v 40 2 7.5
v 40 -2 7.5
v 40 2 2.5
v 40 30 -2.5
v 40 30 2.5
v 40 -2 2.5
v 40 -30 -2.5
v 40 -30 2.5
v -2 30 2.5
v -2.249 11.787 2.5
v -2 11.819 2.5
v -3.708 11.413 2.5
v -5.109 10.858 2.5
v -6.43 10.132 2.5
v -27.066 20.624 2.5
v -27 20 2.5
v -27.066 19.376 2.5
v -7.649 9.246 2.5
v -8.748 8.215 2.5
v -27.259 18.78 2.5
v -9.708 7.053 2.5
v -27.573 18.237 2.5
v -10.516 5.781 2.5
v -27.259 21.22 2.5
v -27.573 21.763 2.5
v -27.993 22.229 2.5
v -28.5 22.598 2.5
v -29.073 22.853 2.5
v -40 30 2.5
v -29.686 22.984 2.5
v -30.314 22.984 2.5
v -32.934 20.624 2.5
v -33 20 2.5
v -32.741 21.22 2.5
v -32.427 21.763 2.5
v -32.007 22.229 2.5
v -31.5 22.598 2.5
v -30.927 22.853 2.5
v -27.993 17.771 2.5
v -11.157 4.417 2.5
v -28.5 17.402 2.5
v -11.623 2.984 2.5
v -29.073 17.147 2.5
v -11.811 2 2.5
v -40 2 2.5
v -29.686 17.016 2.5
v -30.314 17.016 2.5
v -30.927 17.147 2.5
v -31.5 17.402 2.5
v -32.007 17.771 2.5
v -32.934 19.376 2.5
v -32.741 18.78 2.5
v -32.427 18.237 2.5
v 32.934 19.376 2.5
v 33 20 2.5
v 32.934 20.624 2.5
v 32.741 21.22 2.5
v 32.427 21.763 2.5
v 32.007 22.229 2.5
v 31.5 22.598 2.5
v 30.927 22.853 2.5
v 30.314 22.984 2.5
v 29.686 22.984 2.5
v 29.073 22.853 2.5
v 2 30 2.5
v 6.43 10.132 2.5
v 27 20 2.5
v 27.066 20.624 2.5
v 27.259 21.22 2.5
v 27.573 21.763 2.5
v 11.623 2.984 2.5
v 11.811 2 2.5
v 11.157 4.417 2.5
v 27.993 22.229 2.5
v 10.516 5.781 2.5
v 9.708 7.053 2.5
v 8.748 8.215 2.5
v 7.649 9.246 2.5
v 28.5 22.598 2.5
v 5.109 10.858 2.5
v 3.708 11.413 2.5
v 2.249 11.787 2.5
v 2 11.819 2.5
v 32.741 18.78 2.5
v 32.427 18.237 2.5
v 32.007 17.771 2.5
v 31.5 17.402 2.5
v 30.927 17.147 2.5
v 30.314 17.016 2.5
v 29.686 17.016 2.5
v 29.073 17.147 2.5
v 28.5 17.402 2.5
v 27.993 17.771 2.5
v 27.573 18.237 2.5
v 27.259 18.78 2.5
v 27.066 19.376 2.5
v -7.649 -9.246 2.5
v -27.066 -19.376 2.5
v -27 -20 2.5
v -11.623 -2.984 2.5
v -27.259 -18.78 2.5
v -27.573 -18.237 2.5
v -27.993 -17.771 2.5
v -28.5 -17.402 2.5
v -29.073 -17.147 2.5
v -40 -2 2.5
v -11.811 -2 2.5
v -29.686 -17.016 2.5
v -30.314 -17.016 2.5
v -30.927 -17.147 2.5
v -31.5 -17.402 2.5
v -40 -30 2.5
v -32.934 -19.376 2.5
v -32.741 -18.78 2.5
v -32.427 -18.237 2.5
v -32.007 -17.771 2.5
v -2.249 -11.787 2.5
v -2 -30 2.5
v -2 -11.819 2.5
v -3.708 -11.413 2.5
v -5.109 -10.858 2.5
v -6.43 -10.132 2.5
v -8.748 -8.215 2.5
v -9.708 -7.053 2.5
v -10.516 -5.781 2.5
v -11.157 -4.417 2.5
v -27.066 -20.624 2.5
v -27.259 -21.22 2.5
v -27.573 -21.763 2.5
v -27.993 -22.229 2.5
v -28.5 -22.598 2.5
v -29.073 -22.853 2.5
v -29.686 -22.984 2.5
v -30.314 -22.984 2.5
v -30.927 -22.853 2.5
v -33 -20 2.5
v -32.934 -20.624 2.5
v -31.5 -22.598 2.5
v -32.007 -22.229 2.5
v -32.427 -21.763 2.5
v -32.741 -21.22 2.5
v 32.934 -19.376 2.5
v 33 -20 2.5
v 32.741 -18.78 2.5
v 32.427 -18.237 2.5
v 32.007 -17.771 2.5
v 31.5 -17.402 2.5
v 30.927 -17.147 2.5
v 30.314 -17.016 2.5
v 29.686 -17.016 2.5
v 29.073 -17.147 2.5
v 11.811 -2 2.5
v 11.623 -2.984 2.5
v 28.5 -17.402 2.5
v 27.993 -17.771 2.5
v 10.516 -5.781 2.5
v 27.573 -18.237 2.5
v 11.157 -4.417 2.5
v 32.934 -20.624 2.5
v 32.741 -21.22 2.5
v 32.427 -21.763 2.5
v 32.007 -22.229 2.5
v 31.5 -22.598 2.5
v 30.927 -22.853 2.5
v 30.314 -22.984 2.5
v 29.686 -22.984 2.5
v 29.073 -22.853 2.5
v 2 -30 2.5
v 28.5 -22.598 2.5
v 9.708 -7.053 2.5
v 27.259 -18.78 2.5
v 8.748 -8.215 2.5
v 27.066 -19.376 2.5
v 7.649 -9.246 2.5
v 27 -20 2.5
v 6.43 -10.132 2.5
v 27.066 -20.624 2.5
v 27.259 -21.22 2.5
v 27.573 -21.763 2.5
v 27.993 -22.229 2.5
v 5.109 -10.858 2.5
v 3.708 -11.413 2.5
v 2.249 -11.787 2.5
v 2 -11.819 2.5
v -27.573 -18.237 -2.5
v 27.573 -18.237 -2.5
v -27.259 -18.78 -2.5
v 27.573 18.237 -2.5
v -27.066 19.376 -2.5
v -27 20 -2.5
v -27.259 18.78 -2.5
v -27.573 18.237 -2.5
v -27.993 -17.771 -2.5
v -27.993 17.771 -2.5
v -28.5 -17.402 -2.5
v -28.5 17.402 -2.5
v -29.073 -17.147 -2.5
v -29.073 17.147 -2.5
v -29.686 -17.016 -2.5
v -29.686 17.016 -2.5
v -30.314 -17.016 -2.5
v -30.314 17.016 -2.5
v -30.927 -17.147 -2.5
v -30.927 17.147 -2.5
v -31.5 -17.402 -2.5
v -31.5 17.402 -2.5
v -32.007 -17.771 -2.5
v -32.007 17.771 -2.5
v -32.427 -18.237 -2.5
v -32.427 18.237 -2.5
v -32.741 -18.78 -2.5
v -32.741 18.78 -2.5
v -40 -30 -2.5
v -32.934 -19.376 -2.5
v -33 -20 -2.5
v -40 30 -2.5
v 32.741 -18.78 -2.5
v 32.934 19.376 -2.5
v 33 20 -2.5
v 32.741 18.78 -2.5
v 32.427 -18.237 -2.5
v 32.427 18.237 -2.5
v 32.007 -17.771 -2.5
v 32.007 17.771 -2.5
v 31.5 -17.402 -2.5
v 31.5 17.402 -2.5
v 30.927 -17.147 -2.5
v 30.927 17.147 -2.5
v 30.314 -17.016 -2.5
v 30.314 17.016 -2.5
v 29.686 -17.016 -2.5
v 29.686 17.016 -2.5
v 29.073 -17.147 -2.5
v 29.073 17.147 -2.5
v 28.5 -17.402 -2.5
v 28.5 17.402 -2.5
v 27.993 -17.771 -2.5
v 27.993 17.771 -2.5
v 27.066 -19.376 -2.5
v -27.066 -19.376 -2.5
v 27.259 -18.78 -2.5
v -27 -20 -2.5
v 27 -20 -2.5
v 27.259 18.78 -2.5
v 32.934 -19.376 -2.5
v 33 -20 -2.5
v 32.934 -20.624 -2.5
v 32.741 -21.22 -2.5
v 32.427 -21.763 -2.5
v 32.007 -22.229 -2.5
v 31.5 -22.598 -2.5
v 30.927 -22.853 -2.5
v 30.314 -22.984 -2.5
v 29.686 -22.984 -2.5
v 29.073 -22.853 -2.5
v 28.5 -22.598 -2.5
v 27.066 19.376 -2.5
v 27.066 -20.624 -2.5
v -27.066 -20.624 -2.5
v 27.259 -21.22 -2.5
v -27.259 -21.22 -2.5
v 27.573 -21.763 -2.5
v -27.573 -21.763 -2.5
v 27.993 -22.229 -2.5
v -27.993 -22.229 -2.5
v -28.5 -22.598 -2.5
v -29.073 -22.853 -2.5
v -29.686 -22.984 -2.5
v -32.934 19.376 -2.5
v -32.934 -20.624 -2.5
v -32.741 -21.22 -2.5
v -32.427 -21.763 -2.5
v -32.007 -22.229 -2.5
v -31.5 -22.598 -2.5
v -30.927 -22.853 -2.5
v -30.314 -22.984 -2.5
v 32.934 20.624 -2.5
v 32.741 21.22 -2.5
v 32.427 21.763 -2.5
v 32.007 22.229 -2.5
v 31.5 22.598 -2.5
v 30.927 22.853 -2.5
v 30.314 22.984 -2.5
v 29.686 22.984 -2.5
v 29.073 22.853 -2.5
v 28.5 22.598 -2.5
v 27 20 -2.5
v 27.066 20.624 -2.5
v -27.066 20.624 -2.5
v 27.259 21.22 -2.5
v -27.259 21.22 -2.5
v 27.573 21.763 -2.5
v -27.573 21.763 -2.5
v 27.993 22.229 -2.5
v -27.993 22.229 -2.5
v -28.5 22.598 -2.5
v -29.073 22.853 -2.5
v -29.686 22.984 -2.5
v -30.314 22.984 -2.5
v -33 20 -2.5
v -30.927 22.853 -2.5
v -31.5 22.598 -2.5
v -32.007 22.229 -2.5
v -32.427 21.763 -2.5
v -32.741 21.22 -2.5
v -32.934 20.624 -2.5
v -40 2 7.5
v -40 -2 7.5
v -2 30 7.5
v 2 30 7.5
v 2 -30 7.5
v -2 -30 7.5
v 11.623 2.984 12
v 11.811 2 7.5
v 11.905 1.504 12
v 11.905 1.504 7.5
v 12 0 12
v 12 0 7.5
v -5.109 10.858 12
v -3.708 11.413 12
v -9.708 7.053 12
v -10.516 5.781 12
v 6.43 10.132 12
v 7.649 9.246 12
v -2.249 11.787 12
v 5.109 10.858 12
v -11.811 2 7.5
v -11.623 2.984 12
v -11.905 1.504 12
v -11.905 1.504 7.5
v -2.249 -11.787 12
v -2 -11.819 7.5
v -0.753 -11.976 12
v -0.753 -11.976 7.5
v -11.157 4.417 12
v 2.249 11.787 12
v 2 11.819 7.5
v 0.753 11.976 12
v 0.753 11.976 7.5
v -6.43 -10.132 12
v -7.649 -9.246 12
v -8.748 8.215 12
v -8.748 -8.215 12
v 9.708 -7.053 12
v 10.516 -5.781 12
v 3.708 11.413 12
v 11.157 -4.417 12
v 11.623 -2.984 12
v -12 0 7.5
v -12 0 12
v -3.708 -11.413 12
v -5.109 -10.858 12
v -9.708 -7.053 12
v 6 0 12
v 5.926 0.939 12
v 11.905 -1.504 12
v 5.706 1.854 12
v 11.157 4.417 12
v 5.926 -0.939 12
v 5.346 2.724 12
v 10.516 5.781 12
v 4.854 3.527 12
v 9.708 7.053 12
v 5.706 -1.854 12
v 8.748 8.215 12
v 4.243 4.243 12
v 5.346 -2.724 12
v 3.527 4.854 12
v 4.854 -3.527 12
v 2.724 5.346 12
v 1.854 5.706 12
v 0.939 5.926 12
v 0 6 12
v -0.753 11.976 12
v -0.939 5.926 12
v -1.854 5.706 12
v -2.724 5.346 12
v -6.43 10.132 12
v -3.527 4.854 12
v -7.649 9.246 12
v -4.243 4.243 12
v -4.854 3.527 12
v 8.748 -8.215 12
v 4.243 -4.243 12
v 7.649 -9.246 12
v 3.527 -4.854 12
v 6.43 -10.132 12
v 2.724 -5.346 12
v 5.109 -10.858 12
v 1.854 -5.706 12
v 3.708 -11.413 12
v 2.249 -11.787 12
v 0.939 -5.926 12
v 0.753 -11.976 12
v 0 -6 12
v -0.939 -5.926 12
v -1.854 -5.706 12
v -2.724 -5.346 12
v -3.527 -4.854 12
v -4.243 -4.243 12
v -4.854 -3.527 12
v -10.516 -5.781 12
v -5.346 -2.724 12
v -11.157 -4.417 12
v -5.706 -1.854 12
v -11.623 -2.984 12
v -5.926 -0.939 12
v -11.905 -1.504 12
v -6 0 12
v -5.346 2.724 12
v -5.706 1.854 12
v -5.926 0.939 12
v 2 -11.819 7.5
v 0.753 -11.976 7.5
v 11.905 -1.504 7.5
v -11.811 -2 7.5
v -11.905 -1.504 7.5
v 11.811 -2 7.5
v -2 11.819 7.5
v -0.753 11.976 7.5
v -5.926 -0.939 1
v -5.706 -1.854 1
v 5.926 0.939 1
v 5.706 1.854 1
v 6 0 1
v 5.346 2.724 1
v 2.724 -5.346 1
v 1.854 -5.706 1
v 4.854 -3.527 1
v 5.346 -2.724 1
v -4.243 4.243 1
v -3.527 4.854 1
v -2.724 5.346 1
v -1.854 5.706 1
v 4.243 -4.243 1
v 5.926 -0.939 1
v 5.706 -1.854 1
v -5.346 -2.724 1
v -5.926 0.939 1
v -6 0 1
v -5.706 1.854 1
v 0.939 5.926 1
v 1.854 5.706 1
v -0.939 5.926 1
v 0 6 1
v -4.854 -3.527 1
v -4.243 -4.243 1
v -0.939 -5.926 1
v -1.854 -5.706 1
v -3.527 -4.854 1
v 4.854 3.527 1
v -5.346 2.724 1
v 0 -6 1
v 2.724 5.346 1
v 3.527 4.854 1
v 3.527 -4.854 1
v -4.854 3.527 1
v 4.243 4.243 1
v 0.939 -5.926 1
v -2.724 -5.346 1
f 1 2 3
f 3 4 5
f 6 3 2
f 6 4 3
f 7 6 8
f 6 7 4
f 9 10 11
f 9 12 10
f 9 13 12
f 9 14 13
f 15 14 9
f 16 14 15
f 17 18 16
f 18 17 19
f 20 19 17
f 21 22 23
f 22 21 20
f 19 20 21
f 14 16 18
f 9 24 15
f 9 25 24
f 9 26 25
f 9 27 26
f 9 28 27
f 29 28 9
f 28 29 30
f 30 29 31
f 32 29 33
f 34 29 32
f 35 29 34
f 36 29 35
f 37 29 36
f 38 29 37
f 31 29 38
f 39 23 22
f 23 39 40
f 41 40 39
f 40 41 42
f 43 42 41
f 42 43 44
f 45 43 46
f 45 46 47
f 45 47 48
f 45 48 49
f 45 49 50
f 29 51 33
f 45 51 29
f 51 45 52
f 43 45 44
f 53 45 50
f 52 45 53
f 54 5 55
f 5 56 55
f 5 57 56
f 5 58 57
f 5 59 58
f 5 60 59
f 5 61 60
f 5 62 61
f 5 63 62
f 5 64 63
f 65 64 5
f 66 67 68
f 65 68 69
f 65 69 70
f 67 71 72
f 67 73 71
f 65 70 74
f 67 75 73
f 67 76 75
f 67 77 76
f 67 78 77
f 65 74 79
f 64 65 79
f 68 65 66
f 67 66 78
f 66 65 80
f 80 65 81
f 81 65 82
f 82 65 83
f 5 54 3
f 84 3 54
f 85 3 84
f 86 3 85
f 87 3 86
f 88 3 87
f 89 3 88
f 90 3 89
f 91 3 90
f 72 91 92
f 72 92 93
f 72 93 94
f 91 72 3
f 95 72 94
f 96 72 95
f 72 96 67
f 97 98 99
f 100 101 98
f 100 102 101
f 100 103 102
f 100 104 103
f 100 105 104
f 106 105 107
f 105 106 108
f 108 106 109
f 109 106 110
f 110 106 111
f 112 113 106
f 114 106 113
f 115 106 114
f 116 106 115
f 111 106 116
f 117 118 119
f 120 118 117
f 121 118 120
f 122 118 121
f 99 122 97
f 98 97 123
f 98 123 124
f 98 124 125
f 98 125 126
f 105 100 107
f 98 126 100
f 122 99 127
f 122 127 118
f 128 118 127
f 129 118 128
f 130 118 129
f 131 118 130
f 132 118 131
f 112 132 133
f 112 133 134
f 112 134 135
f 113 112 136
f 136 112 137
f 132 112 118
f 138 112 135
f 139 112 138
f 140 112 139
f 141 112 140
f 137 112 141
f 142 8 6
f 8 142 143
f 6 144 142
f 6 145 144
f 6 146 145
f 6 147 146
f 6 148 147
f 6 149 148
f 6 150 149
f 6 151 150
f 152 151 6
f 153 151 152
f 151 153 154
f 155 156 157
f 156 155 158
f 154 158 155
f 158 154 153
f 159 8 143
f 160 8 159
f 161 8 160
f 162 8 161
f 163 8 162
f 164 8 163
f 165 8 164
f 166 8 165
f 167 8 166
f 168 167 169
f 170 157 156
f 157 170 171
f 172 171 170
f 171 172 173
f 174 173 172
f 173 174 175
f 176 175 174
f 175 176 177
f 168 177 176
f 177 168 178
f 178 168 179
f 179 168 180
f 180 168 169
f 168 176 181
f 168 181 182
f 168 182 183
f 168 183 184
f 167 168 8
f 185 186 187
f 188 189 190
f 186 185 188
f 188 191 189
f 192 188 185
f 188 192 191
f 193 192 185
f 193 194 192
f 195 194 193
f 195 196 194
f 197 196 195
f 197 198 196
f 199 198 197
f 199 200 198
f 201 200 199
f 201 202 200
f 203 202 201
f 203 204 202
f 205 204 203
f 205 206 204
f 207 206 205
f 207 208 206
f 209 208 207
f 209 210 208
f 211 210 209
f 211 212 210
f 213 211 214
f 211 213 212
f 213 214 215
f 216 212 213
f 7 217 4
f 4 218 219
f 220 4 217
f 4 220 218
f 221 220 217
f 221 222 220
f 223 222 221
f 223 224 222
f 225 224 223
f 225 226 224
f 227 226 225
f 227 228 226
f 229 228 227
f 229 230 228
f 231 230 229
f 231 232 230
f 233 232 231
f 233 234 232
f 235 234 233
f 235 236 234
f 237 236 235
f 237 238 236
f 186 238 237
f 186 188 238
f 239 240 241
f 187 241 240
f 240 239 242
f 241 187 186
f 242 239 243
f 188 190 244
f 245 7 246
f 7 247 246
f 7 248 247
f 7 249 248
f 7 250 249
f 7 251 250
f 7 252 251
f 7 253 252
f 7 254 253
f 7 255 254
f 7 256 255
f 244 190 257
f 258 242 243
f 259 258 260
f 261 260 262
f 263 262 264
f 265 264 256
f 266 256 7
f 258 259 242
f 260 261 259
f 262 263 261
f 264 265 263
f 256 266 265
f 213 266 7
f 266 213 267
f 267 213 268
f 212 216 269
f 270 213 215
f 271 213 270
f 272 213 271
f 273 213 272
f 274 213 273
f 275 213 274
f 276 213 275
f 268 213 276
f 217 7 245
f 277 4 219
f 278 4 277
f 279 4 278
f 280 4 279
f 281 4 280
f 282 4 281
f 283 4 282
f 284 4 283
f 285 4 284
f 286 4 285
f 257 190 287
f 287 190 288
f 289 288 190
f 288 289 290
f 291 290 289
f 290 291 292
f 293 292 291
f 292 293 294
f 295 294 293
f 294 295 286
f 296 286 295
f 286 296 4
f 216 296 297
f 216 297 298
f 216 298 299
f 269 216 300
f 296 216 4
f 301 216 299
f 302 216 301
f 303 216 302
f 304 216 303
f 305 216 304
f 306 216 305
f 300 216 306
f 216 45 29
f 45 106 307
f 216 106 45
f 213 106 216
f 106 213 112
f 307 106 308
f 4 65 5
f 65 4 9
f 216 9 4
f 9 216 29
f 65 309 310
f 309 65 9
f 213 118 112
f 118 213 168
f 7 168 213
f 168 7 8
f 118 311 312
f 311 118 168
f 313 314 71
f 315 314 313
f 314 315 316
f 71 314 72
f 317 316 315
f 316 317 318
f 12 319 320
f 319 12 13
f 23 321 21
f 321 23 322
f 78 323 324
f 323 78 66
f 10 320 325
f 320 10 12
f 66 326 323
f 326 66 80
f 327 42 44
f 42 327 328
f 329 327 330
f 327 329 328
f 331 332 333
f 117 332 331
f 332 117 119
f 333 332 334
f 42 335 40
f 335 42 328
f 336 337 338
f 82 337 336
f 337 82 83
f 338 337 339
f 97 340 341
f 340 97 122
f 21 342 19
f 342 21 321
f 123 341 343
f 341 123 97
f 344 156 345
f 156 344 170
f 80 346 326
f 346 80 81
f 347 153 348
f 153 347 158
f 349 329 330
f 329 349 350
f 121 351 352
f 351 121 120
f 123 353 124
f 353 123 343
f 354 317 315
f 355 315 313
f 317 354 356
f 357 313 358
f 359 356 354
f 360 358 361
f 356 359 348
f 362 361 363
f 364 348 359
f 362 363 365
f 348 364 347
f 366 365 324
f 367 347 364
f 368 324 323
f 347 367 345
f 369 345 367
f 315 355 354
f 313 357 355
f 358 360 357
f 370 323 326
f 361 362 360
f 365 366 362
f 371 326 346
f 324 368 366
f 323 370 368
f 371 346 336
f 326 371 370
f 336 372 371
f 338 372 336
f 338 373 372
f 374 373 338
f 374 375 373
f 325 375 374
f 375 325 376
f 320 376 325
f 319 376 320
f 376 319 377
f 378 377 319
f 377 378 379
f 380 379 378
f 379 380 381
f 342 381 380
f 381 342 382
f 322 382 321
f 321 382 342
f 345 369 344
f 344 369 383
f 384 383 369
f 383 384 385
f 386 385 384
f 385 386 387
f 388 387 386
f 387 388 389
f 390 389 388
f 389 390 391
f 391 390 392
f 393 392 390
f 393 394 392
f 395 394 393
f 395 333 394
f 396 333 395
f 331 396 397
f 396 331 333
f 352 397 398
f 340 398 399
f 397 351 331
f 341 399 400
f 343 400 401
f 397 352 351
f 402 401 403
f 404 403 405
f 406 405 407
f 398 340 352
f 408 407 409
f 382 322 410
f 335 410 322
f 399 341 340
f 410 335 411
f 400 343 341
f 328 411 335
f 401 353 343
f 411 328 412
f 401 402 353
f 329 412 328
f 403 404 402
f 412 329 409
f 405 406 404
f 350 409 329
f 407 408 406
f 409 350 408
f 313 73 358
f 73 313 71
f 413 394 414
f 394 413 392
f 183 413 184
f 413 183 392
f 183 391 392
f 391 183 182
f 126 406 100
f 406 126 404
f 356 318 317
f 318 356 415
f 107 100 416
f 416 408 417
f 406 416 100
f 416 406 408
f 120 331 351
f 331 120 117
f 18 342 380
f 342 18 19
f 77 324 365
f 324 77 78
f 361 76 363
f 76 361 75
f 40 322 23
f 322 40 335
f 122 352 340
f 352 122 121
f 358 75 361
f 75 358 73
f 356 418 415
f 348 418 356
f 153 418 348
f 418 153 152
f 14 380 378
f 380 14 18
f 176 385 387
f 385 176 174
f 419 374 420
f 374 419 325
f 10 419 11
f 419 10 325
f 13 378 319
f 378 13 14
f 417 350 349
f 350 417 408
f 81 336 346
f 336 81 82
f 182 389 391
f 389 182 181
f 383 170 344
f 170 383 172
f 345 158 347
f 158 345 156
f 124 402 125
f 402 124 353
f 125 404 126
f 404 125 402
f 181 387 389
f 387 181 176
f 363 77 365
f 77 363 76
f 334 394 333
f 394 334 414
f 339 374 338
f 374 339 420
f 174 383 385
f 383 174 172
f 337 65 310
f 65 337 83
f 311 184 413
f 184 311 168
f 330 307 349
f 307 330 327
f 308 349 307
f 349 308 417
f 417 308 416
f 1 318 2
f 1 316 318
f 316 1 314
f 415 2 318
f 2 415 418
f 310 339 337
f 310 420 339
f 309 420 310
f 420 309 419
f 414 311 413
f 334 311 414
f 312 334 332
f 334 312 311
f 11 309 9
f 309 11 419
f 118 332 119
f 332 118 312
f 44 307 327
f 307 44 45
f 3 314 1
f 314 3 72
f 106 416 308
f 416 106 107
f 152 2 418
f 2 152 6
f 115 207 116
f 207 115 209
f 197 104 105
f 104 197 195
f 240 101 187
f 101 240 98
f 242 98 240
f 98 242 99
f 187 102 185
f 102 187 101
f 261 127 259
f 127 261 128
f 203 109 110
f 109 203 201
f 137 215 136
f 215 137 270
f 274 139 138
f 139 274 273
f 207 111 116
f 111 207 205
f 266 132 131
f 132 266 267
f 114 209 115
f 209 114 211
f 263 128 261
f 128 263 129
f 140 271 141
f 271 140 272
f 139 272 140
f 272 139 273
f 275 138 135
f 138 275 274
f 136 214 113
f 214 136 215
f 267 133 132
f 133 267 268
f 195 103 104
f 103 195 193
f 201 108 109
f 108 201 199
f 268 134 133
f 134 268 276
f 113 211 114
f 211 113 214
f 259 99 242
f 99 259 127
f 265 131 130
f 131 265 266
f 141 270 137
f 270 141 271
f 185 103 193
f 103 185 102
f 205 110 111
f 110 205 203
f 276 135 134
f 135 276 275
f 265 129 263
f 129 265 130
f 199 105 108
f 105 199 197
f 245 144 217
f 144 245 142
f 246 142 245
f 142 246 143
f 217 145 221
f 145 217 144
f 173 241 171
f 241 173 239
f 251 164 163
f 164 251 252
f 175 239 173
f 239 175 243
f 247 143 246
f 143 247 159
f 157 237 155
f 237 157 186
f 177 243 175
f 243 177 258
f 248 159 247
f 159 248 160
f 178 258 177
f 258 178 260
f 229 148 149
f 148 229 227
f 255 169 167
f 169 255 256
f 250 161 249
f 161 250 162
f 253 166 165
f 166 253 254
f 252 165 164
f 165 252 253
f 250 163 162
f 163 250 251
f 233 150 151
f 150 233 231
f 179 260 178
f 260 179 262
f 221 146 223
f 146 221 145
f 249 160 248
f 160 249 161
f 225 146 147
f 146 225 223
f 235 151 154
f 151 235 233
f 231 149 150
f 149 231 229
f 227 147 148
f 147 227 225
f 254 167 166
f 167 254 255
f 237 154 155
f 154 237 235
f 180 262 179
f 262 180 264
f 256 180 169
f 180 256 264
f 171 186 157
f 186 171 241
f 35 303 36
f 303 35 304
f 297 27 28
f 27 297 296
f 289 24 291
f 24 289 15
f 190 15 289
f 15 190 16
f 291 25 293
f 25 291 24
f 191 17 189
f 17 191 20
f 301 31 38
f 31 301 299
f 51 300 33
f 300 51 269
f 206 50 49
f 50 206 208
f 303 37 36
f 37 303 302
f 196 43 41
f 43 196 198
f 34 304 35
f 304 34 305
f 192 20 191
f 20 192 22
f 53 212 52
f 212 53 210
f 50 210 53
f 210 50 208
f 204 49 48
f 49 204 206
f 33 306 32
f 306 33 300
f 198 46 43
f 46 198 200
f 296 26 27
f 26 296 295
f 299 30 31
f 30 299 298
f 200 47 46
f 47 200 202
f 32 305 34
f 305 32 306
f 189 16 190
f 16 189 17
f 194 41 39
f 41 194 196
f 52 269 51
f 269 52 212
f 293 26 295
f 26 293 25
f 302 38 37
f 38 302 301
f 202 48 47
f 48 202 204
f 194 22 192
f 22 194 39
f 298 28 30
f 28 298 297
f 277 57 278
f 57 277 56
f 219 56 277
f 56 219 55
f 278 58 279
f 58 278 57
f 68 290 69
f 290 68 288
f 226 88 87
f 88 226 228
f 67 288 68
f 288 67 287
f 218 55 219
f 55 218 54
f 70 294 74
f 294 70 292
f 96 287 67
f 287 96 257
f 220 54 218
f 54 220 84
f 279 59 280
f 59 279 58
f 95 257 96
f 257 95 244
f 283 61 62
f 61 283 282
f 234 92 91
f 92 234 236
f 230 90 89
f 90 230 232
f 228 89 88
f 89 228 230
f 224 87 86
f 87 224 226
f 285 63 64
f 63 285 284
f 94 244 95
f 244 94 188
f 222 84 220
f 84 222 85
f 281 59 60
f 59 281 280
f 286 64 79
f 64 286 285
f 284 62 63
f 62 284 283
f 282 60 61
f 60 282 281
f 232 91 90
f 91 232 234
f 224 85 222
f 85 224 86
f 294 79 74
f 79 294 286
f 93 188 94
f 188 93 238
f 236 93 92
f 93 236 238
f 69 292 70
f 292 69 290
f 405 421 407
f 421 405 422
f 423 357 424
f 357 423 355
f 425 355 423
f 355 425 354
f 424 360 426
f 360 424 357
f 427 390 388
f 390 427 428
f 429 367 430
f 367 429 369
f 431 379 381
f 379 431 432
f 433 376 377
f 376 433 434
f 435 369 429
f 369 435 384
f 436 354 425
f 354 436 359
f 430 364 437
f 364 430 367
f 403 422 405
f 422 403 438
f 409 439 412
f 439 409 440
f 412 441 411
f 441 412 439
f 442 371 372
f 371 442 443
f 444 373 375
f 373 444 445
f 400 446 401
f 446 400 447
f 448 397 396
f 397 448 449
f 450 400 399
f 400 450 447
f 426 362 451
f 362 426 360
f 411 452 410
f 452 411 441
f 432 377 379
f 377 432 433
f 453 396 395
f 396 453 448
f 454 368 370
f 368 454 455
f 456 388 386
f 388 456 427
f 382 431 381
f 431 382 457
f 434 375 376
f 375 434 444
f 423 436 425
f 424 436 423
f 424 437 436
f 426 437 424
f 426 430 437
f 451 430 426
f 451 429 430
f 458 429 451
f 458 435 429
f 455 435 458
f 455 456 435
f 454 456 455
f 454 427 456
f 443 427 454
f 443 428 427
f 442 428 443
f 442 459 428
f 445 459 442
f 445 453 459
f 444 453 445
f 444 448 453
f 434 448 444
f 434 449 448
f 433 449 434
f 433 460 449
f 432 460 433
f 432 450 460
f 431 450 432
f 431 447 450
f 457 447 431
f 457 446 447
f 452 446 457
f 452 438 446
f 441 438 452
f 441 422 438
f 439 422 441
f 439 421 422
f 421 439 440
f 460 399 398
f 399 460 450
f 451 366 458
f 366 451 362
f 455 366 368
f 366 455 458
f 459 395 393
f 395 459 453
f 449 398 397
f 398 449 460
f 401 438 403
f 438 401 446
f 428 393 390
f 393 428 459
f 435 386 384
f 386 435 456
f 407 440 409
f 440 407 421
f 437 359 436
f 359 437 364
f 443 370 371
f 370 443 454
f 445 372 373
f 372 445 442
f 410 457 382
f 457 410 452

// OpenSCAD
difference() {
	union() {
		cube(center = true, size = [80, 60, 5]);
		translate(v = [0, 0, 7]) {
			cylinder($fn = 50, center = true, h = 10, r = 12);
		}
		translate(v = [0, 0, 2.5]) {
			cube(center = true, size = [4, 60, 10]);
		}
		translate(v = [0, 0, 2.5]) {
			cube(center = true, size = [80, 4, 10]);
		}
	}
	translate(v = [-30, -20, 0]) {
		cylinder($fn = 30, center = true, h = 6, r = 3);
	}
	translate(v = [30, -20, 0]) {
		cylinder($fn = 30, center = true, h = 6, r = 3);
	}
	translate(v = [-30, 20, 0]) {
		cylinder($fn = 30, center = true, h = 6, r = 3);
	}
	translate(v = [30, 20, 0]) {
		cylinder($fn = 30, center = true, h = 6, r = 3);
	}
	translate(v = [0, 0, 7]) {
		cylinder($fn = 40, center = true, h = 12, r = 6);
	}
}
